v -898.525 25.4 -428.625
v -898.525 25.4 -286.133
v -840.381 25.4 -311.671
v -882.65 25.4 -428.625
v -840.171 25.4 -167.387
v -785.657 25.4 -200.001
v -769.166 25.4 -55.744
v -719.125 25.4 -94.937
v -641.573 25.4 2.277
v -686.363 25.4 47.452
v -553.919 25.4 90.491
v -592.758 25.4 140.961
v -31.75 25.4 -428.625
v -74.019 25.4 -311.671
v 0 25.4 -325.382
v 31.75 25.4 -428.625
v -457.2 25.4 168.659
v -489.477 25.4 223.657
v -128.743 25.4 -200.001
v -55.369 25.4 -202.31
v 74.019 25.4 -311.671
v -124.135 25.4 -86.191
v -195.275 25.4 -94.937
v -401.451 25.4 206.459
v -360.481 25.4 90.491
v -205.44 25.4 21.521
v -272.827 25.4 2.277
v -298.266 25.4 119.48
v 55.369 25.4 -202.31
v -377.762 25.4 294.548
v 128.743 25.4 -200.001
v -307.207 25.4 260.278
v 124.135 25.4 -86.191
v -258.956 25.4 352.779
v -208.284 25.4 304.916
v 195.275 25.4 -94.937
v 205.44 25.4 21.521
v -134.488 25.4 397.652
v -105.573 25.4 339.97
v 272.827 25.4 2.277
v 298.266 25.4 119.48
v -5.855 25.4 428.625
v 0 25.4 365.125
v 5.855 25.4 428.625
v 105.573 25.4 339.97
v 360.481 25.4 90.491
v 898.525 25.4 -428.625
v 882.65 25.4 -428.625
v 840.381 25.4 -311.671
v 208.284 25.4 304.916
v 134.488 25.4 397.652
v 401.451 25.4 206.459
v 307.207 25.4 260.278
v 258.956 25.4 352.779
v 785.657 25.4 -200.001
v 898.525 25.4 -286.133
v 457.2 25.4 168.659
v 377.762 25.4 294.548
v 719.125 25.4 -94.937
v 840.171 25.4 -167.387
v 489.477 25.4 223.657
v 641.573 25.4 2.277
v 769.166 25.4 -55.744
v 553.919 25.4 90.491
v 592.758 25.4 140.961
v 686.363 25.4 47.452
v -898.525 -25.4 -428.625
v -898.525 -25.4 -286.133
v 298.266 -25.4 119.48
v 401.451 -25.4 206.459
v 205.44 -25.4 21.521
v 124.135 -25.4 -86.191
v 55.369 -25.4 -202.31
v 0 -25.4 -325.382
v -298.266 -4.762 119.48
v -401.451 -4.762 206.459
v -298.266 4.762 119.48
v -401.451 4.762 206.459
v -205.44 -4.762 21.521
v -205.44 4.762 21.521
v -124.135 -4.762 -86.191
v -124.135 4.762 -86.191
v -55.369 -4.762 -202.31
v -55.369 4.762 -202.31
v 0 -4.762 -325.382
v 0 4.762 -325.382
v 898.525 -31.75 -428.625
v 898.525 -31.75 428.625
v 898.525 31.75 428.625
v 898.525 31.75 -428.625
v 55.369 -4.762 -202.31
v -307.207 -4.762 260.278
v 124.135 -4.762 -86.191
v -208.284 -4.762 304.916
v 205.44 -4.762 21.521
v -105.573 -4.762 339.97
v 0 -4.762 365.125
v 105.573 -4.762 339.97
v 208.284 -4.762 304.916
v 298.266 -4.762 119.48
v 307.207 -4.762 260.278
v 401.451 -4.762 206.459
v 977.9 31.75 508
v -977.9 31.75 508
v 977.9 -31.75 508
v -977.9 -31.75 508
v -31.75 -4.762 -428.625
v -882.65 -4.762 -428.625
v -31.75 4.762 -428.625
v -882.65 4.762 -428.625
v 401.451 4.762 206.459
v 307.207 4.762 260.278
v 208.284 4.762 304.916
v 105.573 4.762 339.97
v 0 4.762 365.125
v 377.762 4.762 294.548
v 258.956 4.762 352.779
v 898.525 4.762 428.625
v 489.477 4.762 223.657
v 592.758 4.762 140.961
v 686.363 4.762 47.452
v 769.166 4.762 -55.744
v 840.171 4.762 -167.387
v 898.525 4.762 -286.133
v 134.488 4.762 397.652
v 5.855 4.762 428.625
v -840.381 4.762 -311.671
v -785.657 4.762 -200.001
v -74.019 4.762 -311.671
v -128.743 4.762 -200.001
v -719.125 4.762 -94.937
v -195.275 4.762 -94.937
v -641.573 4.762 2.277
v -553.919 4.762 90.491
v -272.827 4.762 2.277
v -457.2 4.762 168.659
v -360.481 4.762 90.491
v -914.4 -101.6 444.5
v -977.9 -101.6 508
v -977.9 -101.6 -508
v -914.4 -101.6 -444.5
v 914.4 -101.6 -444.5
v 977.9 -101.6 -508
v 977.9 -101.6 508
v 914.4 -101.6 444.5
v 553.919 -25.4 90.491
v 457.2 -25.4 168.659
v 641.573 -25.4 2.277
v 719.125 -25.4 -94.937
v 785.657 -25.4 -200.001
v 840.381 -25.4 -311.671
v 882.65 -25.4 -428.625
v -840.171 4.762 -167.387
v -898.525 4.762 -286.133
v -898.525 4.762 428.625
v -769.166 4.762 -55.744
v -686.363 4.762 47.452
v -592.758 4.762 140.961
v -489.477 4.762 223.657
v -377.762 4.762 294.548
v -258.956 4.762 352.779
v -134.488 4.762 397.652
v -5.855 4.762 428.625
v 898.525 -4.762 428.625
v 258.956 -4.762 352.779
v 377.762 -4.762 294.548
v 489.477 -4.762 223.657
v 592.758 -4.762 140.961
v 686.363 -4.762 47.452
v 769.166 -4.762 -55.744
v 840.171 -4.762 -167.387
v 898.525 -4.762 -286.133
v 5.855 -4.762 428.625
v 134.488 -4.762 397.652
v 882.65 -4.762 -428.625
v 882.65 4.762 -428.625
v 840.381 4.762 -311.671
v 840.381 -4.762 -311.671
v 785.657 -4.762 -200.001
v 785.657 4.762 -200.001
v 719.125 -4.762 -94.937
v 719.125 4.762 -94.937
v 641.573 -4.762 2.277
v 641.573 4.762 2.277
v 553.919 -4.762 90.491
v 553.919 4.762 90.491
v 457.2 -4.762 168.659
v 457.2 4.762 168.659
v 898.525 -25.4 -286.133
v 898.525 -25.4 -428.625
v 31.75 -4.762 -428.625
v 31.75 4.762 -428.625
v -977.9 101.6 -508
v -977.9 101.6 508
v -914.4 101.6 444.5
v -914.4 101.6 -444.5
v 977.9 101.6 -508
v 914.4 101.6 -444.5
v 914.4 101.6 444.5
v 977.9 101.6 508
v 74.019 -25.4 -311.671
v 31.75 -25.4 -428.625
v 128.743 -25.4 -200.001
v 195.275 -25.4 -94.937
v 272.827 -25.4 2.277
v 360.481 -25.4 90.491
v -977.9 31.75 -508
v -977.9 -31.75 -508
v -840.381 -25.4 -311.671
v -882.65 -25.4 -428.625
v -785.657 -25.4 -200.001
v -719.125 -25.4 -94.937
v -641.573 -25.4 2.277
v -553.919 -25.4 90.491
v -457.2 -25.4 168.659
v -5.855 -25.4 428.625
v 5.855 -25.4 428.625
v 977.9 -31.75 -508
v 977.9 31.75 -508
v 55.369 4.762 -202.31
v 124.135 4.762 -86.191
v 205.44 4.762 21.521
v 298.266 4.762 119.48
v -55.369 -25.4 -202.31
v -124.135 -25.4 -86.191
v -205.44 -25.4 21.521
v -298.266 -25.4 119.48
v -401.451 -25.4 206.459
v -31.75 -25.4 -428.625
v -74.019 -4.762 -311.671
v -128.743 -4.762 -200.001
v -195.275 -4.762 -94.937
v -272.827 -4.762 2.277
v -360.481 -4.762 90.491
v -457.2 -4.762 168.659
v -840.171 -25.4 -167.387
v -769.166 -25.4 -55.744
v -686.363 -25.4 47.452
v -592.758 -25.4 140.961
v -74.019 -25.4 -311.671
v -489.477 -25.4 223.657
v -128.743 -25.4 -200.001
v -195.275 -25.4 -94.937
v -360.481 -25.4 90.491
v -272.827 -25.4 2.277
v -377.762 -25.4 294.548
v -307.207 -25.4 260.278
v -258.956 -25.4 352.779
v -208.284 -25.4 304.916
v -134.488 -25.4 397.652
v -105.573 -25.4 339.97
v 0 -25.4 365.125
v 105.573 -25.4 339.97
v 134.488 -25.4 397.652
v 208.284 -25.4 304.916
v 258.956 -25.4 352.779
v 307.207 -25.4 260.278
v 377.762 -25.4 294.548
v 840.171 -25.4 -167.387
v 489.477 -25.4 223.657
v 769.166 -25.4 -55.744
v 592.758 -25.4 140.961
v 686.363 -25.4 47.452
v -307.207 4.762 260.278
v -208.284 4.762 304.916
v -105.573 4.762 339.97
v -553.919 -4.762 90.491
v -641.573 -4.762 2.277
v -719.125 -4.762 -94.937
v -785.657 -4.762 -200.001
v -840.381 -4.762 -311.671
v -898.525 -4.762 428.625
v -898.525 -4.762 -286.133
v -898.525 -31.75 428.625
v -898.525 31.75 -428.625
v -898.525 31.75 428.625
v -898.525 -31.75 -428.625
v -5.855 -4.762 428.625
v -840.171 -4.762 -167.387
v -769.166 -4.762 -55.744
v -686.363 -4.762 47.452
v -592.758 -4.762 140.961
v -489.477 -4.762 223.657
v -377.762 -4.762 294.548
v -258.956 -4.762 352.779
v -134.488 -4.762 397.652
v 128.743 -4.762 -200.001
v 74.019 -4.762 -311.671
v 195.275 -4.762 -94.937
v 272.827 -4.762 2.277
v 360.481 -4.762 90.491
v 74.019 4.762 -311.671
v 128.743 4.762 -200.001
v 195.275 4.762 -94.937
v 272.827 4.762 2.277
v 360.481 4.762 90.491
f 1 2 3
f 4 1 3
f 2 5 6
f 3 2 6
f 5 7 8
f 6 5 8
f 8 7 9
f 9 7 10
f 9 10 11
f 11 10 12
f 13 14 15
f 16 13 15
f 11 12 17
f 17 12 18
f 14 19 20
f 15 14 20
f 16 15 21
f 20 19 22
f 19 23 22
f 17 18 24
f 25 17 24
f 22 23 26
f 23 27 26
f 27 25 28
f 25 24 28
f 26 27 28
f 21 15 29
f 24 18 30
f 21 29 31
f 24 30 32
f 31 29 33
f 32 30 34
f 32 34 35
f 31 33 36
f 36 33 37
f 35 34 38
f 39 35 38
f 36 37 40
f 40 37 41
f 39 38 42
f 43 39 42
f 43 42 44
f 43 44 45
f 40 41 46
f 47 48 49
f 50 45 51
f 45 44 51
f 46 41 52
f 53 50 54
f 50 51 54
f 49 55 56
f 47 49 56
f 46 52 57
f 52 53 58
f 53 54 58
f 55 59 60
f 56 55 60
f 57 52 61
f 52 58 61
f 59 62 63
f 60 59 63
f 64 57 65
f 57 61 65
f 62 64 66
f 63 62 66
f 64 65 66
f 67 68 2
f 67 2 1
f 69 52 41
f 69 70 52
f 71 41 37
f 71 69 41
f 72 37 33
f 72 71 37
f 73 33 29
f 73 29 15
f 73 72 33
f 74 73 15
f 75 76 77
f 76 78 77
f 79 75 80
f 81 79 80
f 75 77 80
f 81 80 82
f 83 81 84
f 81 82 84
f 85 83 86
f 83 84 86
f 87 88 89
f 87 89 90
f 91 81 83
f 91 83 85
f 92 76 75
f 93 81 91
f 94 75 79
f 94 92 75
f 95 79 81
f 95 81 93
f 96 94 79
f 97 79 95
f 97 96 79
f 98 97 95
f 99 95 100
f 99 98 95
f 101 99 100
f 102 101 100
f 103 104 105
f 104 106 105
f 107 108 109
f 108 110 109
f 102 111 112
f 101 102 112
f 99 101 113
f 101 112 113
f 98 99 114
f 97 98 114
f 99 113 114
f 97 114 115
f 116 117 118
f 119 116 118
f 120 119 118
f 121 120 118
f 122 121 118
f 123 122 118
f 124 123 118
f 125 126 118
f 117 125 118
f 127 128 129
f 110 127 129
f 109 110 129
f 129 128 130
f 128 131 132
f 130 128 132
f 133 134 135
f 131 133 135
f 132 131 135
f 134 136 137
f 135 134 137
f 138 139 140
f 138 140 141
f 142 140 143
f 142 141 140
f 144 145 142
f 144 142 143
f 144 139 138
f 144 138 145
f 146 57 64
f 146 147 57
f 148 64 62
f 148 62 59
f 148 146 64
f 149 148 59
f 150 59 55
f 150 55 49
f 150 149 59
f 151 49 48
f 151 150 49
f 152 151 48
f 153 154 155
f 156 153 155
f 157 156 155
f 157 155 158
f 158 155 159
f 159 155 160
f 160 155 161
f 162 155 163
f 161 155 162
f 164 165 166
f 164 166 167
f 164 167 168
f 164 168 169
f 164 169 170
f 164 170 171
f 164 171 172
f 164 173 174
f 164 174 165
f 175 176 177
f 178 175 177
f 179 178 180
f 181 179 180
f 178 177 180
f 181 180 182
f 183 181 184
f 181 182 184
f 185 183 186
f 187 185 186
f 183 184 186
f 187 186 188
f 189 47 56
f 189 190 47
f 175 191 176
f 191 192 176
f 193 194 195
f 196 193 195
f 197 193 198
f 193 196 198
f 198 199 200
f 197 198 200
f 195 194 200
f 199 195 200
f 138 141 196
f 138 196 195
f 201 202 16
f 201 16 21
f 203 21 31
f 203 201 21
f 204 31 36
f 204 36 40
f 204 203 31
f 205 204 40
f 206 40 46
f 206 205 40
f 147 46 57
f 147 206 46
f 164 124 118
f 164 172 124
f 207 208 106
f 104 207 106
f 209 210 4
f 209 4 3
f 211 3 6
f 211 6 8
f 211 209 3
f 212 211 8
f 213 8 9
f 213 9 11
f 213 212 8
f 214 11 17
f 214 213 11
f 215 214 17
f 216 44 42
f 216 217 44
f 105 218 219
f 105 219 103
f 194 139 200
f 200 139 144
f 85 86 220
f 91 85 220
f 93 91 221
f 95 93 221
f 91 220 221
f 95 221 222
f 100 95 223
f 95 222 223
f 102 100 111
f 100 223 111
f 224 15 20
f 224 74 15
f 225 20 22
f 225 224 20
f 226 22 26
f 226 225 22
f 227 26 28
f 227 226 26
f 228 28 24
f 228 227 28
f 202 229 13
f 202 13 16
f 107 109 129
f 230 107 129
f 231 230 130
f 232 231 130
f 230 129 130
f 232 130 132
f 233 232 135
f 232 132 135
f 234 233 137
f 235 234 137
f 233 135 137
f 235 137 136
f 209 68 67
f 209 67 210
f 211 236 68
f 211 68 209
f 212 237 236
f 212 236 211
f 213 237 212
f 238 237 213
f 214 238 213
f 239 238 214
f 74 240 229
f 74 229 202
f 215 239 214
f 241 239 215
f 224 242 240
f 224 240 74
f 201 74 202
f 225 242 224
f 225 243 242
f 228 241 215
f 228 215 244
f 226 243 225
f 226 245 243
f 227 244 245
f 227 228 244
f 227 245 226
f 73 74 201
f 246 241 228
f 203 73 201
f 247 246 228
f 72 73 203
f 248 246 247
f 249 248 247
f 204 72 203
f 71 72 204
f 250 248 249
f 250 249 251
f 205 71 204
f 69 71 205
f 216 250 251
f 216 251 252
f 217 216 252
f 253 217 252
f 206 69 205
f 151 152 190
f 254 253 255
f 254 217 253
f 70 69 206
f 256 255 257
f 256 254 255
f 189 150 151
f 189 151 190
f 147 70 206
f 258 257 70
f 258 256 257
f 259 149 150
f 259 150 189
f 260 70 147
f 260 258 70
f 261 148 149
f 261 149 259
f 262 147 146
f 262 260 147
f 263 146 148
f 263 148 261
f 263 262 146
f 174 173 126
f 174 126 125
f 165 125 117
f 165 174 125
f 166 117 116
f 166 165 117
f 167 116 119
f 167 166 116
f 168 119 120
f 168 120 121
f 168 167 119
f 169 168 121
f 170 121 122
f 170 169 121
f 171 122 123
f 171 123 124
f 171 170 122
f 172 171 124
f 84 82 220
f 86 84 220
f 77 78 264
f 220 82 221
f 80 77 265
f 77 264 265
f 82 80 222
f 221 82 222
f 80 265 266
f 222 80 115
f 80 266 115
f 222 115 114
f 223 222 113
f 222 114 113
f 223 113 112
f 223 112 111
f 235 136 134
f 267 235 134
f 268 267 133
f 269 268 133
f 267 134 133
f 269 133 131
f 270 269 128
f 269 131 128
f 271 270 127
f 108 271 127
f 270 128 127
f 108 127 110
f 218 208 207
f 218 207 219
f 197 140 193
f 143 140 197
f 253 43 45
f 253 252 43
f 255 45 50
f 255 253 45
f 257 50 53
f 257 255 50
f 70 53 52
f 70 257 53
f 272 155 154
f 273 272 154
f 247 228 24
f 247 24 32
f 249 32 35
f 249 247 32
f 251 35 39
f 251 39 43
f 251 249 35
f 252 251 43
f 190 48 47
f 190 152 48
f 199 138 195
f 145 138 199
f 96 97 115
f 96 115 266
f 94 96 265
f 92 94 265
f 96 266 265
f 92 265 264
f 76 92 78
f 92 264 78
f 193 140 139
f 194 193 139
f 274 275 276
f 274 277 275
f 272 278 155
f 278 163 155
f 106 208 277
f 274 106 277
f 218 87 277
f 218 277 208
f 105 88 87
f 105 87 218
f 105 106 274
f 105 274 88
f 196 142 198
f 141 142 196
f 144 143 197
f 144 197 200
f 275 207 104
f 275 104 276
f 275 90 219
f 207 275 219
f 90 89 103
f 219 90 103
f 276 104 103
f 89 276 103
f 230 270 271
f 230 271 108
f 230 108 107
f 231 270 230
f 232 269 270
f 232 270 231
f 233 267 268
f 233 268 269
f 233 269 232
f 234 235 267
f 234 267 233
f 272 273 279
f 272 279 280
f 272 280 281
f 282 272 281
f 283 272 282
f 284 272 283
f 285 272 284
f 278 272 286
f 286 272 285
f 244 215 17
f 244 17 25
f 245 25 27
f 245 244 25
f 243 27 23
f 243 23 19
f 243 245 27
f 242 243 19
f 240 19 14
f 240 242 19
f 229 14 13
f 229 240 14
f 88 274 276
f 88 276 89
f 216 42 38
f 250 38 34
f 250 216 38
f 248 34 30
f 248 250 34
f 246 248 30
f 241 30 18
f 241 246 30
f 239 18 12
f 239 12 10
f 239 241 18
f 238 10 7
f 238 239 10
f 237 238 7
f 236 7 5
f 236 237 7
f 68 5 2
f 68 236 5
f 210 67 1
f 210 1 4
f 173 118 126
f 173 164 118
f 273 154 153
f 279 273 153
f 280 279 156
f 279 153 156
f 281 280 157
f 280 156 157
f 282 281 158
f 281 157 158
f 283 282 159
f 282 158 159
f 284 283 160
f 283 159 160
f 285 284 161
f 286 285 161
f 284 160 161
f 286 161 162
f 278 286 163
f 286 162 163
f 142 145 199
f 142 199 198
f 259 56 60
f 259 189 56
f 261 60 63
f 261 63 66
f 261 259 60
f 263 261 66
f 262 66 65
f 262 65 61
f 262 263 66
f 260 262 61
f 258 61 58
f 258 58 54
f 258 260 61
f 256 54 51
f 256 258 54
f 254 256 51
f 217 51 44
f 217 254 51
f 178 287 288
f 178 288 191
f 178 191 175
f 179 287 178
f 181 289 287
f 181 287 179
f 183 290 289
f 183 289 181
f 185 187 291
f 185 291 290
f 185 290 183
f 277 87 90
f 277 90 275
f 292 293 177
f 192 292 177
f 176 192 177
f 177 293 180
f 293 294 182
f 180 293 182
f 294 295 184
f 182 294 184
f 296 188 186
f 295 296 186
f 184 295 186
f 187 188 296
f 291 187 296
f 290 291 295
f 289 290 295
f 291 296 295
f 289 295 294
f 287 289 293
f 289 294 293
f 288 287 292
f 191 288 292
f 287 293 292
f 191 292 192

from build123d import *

# Parameters (mm, degrees)
F0_W     = 1955.8
F0_H     = 1016
F1_DEPTH = 101.6
F2_DEPTH = 31.75
F3_DEPTH = 4.7625
F4_DEPTH = 25.4


with BuildPart() as f1:
    # F0 (on Front) → F1 (new body, symmetric)
    with BuildSketch(Plane.XZ):
        Rectangle(F0_W, F0_H)
        Polygon((914.4, 444.5), (914.4, -444.5), (-914.4, -444.5), (-914.4, 365.125), (-914.4, 444.5), align=None, mode=Mode.SUBTRACT)
    extrude(amount=F1_DEPTH, both=True)


with BuildPart() as f2:
    # F0 (on Front) → F2 (new body, symmetric)
    with BuildSketch(Plane.XZ):
        with BuildLine():
            Line((-898.525, 426.743058), (-898.525, 362.014376))
            Line((-898.525, 362.014376), (-898.525, -286.133033))
            ThreePointArc((-898.525, -286.133033), (-542.252292, 183.725861), (-5.85502, 428.625))
            Line((-5.85502, 428.625), (-869.724843, 428.625))
            Line((-869.724843, 428.625), (-898.525, 428.625))
            Line((-898.525, 428.625), (-898.525, 426.743058))
        make_face()
        Rectangle(F0_W, F0_H)
        Polygon((914.4, 444.5), (914.4, -444.5), (-914.4, -444.5), (-914.4, 365.125), (-914.4, 444.5), align=None, mode=Mode.SUBTRACT)
        Polygon((-914.4, -444.5), (914.4, -444.5), (914.4, 444.5), (-914.4, 444.5), (-914.4, 365.125), align=None)
        Polygon((-898.525, -286.133033), (-898.525, 362.014376), (-898.525, 426.743058), (-898.525, 428.625), (-869.724843, 428.625), (-5.85502, 428.625), (5.85502, 428.625), (898.525, 428.625), (898.525, -286.133033), (898.525, -428.625), (882.65, -428.625), (31.75, -428.625), (-31.75, -428.625), (-457.2, -428.625), (-882.65, -428.625), (-898.525, -428.625), align=None, mode=Mode.SUBTRACT)
    extrude(amount=F2_DEPTH, both=True)


with BuildPart() as f3:
    # F0 (on Front) → F3 (new body, symmetric)
    with BuildSketch(Plane.XZ):
        with BuildLine():
            Line((-898.525, 426.743058), (-898.525, 362.014376))
            Line((-898.525, 362.014376), (-898.525, -286.133033))
            ThreePointArc((-898.525, -286.133033), (-542.252292, 183.725861), (-5.85502, 428.625))
            Line((-5.85502, 428.625), (-869.724843, 428.625))
            Line((-869.724843, 428.625), (-898.525, 428.625))
            Line((-898.525, 428.625), (-898.525, 426.743058))
        make_face()
        with BuildLine():
            ThreePointArc((-457.2, 168.659371), (-719.125325, -94.937065), (-882.65, -428.625))
            Line((-882.65, -428.625), (-457.2, -428.625))
            Line((-457.2, -428.625), (-31.75, -428.625))
            ThreePointArc((-31.75, -428.625), (-195.274675, -94.937065), (-457.2, 168.659371))
        make_face()
        with BuildLine():
            ThreePointArc((457.2, 168.659371), (195.274675, -94.937065), (31.75, -428.625))
            Line((31.75, -428.625), (882.65, -428.625))
            ThreePointArc((882.65, -428.625), (719.125325, -94.937065), (457.2, 168.659371))
        make_face()
        with BuildLine():
            ThreePointArc((401.451197, 206.458829), (208.283881, 304.915598), (0, 365.125))
            ThreePointArc((0, 365.125), (-208.283881, 304.915598), (-401.451197, 206.458829))
            ThreePointArc((-401.451197, 206.458829), (-163.280746, -31.197229), (0, -325.382482))
            ThreePointArc((0, -325.382482), (163.280746, -31.197229), (401.451197, 206.458829))
        make_face()
        with BuildLine():
            Line((898.525, 428.625), (5.85502, 428.625))
            ThreePointArc((5.85502, 428.625), (542.252292, 183.725861), (898.525, -286.133033))
            Line((898.525, -286.133033), (898.525, 428.625))
        make_face()
    extrude(amount=F3_DEPTH, both=True)


with BuildPart() as f4:
    # F0 (on Front) → F4 (new body, symmetric)
    with BuildSketch(Plane.XZ):
        with BuildLine():
            ThreePointArc((-5.85502, 428.625), (-542.252292, 183.725861), (-898.525, -286.133033))
            Line((-898.525, -286.133033), (-898.525, -428.625))
            Line((-898.525, -428.625), (-882.65, -428.625))
            ThreePointArc((-882.65, -428.625), (-719.125325, -94.937065), (-457.2, 168.659371))
            ThreePointArc((-457.2, 168.659371), (-195.274675, -94.937065), (-31.75, -428.625))
            Line((-31.75, -428.625), (31.75, -428.625))
            ThreePointArc((31.75, -428.625), (195.274675, -94.937065), (457.2, 168.659371))
            ThreePointArc((457.2, 168.659371), (719.125325, -94.937065), (882.65, -428.625))
            Line((882.65, -428.625), (898.525, -428.625))
            Line((898.525, -428.625), (898.525, -286.133033))
            ThreePointArc((898.525, -286.133033), (542.252292, 183.725861), (5.85502, 428.625))
            Line((5.85502, 428.625), (-5.85502, 428.625))
        make_face()
        with BuildLine():
            ThreePointArc((-401.451197, 206.458829), (-208.283881, 304.915598), (0, 365.125))
            ThreePointArc((0, 365.125), (208.283881, 304.915598), (401.451197, 206.458829))
            ThreePointArc((401.451197, 206.458829), (163.280746, -31.197229), (0, -325.382482))
            ThreePointArc((0, -325.382482), (-163.280746, -31.197229), (-401.451197, 206.458829))
        make_face(mode=Mode.SUBTRACT)
    extrude(amount=F4_DEPTH, both=True)


solid = Compound([f1.part, f2.part, f3.part, f4.part])
